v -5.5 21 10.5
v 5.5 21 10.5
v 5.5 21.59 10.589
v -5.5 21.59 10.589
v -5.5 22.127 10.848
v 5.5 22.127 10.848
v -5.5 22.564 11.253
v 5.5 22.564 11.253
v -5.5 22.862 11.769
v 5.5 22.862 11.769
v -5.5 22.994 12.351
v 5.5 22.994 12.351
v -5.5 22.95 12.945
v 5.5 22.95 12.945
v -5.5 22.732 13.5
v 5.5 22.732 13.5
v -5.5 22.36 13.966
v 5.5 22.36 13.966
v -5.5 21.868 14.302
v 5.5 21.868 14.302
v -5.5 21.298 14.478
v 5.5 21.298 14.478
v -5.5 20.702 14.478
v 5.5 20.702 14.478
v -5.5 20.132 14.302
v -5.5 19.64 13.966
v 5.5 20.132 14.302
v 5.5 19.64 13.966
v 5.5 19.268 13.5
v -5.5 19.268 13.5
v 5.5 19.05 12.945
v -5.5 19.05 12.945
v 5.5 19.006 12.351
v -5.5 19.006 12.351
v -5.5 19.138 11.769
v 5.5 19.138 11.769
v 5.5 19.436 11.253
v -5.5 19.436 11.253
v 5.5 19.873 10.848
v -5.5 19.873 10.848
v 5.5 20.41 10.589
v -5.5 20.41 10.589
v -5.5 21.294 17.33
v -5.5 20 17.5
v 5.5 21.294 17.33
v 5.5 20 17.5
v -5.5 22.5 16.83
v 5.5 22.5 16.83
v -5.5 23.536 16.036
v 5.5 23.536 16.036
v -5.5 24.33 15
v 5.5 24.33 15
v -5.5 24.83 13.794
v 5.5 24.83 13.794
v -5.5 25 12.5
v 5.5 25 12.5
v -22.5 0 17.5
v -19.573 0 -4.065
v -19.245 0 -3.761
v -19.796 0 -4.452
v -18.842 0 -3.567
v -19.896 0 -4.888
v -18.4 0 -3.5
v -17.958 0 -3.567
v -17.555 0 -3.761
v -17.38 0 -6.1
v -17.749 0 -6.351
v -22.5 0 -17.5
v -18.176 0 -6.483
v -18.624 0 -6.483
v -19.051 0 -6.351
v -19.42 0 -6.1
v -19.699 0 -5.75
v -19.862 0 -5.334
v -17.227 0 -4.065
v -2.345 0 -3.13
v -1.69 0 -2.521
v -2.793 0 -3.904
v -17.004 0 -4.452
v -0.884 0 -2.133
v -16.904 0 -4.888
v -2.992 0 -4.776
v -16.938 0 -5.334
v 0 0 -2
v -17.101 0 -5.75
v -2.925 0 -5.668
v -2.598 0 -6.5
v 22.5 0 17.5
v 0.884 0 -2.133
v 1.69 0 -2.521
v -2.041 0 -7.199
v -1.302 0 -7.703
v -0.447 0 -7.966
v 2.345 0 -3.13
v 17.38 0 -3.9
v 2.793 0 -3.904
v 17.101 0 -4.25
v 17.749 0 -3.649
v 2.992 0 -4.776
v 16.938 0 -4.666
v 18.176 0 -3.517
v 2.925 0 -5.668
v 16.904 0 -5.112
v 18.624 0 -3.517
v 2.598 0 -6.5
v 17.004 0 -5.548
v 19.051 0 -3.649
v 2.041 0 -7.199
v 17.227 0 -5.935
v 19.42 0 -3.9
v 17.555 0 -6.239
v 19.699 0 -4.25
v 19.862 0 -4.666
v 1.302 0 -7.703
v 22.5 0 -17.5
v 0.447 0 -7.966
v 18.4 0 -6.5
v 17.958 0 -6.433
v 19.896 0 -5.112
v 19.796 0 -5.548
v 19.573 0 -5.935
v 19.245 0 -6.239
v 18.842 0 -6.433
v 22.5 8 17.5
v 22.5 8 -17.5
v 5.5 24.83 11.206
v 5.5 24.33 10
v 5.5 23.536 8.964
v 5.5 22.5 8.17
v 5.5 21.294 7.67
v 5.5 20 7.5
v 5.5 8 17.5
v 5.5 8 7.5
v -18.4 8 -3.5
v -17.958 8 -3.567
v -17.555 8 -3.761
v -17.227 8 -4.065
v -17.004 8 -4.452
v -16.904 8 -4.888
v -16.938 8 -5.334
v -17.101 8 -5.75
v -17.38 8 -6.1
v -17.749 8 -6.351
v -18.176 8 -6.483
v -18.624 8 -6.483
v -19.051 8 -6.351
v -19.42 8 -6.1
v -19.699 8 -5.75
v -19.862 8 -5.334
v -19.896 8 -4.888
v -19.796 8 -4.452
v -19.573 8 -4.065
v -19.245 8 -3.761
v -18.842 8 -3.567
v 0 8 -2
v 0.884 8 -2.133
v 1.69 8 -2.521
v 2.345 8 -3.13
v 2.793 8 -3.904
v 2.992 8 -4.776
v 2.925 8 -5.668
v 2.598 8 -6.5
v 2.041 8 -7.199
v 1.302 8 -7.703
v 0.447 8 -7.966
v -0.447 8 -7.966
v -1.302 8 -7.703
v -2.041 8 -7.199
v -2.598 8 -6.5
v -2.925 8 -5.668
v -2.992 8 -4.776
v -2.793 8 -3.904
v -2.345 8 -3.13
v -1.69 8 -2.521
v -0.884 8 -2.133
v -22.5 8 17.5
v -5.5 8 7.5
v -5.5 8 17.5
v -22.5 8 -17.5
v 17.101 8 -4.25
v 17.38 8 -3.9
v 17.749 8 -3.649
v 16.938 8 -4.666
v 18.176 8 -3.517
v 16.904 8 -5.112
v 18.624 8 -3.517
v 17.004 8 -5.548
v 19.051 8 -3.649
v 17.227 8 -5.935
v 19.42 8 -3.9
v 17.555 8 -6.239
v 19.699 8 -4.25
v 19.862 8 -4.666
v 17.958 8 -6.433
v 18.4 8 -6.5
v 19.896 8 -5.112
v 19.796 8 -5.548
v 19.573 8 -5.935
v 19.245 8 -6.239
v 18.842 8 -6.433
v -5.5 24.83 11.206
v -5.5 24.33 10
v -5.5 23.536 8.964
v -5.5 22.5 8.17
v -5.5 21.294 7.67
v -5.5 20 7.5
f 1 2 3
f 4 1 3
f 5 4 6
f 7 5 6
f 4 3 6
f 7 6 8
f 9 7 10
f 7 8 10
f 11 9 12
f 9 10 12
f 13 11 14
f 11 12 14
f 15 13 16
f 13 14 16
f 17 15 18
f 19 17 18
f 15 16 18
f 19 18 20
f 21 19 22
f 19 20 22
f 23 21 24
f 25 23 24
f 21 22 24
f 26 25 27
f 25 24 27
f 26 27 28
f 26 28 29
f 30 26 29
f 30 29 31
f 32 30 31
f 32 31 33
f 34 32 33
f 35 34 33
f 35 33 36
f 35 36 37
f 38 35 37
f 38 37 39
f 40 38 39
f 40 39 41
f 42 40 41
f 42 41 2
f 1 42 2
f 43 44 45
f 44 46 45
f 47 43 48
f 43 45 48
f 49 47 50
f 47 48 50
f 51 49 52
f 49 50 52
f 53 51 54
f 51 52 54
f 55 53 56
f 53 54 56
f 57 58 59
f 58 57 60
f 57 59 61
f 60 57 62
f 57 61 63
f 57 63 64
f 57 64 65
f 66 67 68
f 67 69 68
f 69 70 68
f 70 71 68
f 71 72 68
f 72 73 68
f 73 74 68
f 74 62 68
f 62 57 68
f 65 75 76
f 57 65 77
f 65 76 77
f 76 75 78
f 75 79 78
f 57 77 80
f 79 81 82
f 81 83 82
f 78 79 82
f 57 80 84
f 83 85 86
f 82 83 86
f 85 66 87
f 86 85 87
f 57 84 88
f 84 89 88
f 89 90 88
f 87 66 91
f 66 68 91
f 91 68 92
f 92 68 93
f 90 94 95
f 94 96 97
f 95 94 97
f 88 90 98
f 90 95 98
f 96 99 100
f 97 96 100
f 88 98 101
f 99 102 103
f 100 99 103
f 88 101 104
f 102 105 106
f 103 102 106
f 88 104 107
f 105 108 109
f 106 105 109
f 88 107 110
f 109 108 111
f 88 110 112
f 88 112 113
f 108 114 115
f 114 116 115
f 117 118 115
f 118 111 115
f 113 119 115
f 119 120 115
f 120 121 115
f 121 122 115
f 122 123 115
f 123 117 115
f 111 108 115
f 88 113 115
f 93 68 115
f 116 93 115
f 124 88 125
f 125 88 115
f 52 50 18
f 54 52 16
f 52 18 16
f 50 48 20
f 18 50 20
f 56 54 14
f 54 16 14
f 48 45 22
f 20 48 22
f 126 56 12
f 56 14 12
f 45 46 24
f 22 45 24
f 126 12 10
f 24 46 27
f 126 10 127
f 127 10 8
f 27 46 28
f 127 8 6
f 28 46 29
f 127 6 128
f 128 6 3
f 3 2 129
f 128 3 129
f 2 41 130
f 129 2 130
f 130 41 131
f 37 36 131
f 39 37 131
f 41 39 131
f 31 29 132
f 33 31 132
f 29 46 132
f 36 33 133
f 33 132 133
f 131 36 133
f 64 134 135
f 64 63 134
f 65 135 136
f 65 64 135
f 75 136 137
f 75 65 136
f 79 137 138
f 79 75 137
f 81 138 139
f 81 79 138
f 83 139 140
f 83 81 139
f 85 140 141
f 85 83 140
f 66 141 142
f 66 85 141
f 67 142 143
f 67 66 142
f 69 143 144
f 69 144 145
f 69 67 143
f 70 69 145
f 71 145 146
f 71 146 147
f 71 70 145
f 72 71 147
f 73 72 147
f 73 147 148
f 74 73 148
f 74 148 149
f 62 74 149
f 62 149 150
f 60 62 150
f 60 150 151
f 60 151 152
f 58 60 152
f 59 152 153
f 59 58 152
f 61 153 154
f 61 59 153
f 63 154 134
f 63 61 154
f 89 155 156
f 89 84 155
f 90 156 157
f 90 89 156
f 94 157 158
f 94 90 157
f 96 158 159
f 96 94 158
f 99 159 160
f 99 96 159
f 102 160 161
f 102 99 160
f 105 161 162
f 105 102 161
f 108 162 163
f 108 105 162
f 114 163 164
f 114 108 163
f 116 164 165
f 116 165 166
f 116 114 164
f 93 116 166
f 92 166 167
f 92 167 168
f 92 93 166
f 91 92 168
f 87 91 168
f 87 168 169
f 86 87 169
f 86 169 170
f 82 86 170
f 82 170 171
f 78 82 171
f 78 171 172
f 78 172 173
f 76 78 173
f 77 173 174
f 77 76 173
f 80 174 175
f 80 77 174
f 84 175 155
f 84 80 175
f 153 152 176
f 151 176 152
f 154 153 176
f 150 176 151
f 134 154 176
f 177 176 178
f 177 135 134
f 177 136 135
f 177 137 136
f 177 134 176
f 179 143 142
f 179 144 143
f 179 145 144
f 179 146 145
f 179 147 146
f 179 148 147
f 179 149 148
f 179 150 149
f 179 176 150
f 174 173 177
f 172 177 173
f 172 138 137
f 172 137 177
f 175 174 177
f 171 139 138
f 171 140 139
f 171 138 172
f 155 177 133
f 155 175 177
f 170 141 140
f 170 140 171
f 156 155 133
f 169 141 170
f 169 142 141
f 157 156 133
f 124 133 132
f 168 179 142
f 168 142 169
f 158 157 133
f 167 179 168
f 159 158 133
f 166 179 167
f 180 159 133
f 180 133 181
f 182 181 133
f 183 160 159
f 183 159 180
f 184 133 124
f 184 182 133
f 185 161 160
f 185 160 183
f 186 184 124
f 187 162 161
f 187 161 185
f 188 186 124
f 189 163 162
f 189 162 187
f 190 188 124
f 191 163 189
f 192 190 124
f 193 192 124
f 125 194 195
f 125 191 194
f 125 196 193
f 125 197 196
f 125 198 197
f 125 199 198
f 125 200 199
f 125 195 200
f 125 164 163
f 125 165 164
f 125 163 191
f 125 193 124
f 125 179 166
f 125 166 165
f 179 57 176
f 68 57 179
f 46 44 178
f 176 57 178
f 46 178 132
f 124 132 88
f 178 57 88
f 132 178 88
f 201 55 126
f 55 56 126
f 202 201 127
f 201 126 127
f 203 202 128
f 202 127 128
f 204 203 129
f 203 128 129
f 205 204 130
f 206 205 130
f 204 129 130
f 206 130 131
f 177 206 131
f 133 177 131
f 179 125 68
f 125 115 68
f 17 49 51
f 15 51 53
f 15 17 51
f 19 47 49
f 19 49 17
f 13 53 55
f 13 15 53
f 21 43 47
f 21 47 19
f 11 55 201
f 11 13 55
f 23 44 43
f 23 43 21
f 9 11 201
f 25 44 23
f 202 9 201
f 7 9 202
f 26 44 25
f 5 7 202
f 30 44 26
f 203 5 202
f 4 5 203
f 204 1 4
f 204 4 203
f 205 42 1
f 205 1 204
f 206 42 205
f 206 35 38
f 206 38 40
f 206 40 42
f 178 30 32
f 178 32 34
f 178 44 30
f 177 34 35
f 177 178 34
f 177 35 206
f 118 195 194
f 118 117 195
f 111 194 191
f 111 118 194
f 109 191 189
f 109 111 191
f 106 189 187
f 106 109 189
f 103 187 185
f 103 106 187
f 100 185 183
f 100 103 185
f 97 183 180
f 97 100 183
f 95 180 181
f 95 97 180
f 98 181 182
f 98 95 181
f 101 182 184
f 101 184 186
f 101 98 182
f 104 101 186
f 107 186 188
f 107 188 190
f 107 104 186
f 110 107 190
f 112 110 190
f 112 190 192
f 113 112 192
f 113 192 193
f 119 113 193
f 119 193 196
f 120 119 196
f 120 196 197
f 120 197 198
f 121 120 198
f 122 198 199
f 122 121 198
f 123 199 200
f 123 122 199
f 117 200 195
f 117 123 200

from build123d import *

# Parameters (mm, degrees)
SKETCH2_W           = 45
SKETCH2_H           = 35
SKETCH2_R           = 3
SKETCH2_R_2         = 1.5
BOSS_EXTRUDE1_DEPTH = 5
SKETCH4_R           = 1.5
SKETCH4_R_2         = 3
SKETCH4_W           = 11
SKETCH4_H           = 10
BOSS_EXTRUDE2_DEPTH = 3
SKETCH4_3_W         = 11
SKETCH4_3_H         = 10
BOSS_EXTRUDE3_DEPTH = 20
SKETCH5_R           = 2
CUT_EXTRUDE1_DEPTH  = 20
FILLET1_R           = 5


with BuildPart() as part:
    # Sketch2 → Boss-Extrude1 (new body)
    with BuildSketch(Plane(origin=(0, 0, 0), x_dir=(1, 0, 0), z_dir=(0, 1, 0))):
        Rectangle(SKETCH2_W, SKETCH2_H)
        with Locations(Location((0, 5, 0), (0, 0, 270))):
            Circle(SKETCH2_R, mode=Mode.SUBTRACT)
        with Locations(Location((-18.4, 5, 0), (0, 0, 270))):
            Circle(SKETCH2_R_2, mode=Mode.SUBTRACT)
        with Locations(Location((18.4, 5, 0), (0, 0, 90))):
            Circle(SKETCH2_R_2, mode=Mode.SUBTRACT)
    extrude(amount=BOSS_EXTRUDE1_DEPTH)

    # Sketch4 → Boss-Extrude2 (add)
    # profile 1 of 3: a face of its own
    with BuildSketch(Plane(origin=(0, 5, 0), x_dir=(1, 0, 0), z_dir=(0, 1, 0))):
        Polygon((5.5, -17.5), (15, -17.5), (22.5, -17.5), (22.5, 17.5), (-22.5, 17.5), (-22.5, -17.5), (-15, -17.5), (-5.5, -17.5), (-5.5, -7.5), (5.5, -7.5), align=None)
        with Locations(Location((-18.4, 5, 0), (0, 0, 270))):
            Circle(SKETCH4_R, mode=Mode.SUBTRACT)
        with Locations(Location((0, 5, 0), (0, 0, 270))):
            Circle(SKETCH4_R_2, mode=Mode.SUBTRACT)
        with Locations(Location((18.4, 5, 0), (0, 0, 90))):
            Circle(SKETCH4_R, mode=Mode.SUBTRACT)
    # profile 2 of 3: a face of its own
    with BuildSketch(Plane(origin=(0, 5, 0), x_dir=(1, 0, 0), z_dir=(0, 1, 0))):
        Polygon((5.5, -17.5), (15, -17.5), (22.5, -17.5), (22.5, 17.5), (-22.5, 17.5), (-22.5, -17.5), (-15, -17.5), (-5.5, -17.5), (-5.5, -7.5), (5.5, -7.5), align=None)
        with Locations(Location((-18.4, 5, 0), (0, 0, 270))):
            Circle(SKETCH4_R, mode=Mode.SUBTRACT)
        with Locations(Location((0, 5, 0), (0, 0, 270))):
            Circle(SKETCH4_R_2, mode=Mode.SUBTRACT)
        with Locations(Location((18.4, 5, 0), (0, 0, 90))):
            Circle(SKETCH4_R, mode=Mode.SUBTRACT)
    # profile 3 of 3: a face of its own
    with BuildSketch(Plane(origin=(0, 5, 0), x_dir=(1, 0, 0), z_dir=(0, 1, 0))):
        with Locations((0, -12.5)):
            Rectangle(SKETCH4_W, SKETCH4_H)
    extrude(amount=BOSS_EXTRUDE2_DEPTH)

    # Sketch4<3> → Boss-Extrude3 (add)
    with BuildSketch(Plane(origin=(0, 5, 0), x_dir=(1, 0, 0), z_dir=(0, 1, 0))):
        with Locations((0, -12.5)):
            Rectangle(SKETCH4_3_W, SKETCH4_3_H)
    extrude(amount=BOSS_EXTRUDE3_DEPTH)

    # Sketch5 → Cut-Extrude1 (cut)
    with BuildSketch(Plane(origin=(5.5, 0, 0), x_dir=(0, 0, -1), z_dir=(1, 0, 0))):
        with Locations((-12.5, 21)):
            Circle(SKETCH5_R)
    extrude(amount=-CUT_EXTRUDE1_DEPTH, mode=Mode.SUBTRACT)

    # Fillet1
    fillet1_edges = [part.edges().sort_by_distance(p)[0] for p in [
        (0, 25, 7.5),
        (0, 25, 17.5),
    ]]
    fillet(fillet1_edges, radius=FILLET1_R - 0.0001)  # a hair under: the kernel refuses the full size


solid = part.part
